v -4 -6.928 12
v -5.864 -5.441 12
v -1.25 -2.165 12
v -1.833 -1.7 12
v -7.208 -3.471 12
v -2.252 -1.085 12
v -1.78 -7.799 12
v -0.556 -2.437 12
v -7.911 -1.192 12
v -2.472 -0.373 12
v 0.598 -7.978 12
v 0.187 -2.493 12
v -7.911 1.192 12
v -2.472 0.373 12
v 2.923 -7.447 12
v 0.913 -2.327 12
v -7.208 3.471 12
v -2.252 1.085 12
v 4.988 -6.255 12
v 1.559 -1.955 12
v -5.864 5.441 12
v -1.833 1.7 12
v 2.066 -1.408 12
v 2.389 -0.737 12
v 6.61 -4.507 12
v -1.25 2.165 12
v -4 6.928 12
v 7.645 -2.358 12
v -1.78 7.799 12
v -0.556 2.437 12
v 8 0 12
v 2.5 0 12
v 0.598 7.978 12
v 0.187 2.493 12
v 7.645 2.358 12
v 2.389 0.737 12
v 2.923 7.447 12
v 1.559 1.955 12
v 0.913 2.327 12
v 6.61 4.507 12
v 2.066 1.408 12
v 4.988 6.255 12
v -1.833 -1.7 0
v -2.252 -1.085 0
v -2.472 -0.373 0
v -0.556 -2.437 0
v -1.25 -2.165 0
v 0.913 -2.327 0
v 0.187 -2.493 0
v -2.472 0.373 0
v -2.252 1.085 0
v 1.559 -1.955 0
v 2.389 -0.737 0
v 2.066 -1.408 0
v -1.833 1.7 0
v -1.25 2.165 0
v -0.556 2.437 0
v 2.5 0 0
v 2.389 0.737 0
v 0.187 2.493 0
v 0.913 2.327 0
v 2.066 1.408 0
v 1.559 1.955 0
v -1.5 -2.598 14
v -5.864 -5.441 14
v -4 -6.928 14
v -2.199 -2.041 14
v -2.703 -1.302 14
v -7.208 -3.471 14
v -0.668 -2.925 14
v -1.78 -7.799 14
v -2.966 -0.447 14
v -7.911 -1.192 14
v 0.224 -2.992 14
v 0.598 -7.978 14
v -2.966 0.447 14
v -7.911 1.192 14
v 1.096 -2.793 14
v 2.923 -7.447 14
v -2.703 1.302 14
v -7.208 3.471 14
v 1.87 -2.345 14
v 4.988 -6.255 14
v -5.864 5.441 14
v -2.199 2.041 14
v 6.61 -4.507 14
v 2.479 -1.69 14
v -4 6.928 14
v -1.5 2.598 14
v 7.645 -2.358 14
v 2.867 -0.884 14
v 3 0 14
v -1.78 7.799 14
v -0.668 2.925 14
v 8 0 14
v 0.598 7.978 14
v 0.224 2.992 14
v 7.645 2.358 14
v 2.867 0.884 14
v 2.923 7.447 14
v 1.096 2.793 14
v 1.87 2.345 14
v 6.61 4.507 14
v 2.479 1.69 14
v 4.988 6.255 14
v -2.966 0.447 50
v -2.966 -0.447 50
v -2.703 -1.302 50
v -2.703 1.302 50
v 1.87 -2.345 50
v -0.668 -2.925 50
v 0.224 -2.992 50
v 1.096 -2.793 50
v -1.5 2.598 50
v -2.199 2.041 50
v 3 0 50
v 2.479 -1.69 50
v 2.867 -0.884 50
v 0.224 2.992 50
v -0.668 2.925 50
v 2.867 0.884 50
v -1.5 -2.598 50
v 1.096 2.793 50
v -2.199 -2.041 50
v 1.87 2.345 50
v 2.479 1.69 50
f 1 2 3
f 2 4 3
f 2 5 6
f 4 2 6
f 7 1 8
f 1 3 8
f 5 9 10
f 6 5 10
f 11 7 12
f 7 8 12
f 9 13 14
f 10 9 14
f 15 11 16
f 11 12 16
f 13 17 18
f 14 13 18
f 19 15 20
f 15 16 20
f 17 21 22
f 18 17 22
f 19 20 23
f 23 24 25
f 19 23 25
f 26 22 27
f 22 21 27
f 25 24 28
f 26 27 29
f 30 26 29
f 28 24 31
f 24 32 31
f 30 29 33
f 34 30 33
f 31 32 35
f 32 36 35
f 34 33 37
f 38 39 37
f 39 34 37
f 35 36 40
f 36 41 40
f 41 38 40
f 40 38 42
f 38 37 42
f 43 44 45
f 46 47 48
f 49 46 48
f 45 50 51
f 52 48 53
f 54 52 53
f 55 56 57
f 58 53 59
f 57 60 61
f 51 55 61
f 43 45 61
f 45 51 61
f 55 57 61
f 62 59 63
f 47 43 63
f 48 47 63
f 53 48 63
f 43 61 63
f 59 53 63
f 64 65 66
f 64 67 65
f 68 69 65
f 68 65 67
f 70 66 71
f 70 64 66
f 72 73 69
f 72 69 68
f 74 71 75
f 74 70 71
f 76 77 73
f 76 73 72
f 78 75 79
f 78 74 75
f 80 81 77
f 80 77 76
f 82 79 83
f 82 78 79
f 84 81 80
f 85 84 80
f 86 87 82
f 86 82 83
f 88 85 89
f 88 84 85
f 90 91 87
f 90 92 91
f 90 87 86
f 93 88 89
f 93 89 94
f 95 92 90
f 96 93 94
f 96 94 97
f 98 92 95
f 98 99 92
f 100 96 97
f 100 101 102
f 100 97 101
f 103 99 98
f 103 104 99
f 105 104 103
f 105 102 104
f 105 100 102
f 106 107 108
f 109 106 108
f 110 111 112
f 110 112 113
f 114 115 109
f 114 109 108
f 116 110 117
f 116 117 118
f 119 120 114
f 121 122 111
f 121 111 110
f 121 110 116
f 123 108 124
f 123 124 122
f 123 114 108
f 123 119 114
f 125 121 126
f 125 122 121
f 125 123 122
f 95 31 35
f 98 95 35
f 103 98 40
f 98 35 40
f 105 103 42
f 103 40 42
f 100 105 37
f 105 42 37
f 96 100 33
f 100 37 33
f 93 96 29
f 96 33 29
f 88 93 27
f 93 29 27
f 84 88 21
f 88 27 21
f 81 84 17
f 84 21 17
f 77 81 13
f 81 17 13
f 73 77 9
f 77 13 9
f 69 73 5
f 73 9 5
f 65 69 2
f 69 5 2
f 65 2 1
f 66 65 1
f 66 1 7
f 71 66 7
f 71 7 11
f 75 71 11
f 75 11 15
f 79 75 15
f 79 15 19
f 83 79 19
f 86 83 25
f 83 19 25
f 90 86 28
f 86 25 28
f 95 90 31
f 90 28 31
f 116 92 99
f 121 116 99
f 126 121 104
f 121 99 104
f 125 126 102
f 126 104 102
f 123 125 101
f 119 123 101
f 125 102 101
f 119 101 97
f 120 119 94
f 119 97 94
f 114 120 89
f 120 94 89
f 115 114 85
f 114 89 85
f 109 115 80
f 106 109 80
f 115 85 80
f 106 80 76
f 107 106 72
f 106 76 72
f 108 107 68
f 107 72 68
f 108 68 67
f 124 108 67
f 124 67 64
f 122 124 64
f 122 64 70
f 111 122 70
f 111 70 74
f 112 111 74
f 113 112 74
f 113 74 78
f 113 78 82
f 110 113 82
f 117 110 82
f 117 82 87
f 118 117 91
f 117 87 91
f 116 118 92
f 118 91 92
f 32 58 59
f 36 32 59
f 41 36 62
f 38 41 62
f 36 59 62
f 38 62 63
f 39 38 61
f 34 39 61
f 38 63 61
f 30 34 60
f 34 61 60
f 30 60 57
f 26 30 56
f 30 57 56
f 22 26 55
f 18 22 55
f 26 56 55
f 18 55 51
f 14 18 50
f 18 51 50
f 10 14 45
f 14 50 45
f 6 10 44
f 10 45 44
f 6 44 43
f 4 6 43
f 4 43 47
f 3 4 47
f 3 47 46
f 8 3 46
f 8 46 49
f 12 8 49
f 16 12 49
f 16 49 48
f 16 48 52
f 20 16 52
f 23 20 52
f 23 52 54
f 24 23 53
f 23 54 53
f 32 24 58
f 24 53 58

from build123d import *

# Parameters (mm, degrees)
F0_R     = 2.5
F1_DEPTH = 12
F2_R     = 8
F2_R_2   = 2.5
F3_DEPTH = 2
F4_R     = 3
F5_DEPTH = 36


with BuildPart() as f1:
    # F0 (on Top) → F1 (new body)
    with BuildSketch(Plane.XY):
        Circle(F0_R)
    extrude(amount=F1_DEPTH)

    # F2 (on face) → F3 (join)
    with BuildSketch(Plane.XY.offset(12)):
        Circle(F2_R)
        Circle(F2_R_2, mode=Mode.SUBTRACT)
        Circle(F2_R)
    extrude(amount=F3_DEPTH)

    # F4 (on face) → F5 (join)
    with BuildSketch(Plane.XY.offset(14)):
        Circle(F4_R)
    extrude(amount=F5_DEPTH)


solid = f1.part
